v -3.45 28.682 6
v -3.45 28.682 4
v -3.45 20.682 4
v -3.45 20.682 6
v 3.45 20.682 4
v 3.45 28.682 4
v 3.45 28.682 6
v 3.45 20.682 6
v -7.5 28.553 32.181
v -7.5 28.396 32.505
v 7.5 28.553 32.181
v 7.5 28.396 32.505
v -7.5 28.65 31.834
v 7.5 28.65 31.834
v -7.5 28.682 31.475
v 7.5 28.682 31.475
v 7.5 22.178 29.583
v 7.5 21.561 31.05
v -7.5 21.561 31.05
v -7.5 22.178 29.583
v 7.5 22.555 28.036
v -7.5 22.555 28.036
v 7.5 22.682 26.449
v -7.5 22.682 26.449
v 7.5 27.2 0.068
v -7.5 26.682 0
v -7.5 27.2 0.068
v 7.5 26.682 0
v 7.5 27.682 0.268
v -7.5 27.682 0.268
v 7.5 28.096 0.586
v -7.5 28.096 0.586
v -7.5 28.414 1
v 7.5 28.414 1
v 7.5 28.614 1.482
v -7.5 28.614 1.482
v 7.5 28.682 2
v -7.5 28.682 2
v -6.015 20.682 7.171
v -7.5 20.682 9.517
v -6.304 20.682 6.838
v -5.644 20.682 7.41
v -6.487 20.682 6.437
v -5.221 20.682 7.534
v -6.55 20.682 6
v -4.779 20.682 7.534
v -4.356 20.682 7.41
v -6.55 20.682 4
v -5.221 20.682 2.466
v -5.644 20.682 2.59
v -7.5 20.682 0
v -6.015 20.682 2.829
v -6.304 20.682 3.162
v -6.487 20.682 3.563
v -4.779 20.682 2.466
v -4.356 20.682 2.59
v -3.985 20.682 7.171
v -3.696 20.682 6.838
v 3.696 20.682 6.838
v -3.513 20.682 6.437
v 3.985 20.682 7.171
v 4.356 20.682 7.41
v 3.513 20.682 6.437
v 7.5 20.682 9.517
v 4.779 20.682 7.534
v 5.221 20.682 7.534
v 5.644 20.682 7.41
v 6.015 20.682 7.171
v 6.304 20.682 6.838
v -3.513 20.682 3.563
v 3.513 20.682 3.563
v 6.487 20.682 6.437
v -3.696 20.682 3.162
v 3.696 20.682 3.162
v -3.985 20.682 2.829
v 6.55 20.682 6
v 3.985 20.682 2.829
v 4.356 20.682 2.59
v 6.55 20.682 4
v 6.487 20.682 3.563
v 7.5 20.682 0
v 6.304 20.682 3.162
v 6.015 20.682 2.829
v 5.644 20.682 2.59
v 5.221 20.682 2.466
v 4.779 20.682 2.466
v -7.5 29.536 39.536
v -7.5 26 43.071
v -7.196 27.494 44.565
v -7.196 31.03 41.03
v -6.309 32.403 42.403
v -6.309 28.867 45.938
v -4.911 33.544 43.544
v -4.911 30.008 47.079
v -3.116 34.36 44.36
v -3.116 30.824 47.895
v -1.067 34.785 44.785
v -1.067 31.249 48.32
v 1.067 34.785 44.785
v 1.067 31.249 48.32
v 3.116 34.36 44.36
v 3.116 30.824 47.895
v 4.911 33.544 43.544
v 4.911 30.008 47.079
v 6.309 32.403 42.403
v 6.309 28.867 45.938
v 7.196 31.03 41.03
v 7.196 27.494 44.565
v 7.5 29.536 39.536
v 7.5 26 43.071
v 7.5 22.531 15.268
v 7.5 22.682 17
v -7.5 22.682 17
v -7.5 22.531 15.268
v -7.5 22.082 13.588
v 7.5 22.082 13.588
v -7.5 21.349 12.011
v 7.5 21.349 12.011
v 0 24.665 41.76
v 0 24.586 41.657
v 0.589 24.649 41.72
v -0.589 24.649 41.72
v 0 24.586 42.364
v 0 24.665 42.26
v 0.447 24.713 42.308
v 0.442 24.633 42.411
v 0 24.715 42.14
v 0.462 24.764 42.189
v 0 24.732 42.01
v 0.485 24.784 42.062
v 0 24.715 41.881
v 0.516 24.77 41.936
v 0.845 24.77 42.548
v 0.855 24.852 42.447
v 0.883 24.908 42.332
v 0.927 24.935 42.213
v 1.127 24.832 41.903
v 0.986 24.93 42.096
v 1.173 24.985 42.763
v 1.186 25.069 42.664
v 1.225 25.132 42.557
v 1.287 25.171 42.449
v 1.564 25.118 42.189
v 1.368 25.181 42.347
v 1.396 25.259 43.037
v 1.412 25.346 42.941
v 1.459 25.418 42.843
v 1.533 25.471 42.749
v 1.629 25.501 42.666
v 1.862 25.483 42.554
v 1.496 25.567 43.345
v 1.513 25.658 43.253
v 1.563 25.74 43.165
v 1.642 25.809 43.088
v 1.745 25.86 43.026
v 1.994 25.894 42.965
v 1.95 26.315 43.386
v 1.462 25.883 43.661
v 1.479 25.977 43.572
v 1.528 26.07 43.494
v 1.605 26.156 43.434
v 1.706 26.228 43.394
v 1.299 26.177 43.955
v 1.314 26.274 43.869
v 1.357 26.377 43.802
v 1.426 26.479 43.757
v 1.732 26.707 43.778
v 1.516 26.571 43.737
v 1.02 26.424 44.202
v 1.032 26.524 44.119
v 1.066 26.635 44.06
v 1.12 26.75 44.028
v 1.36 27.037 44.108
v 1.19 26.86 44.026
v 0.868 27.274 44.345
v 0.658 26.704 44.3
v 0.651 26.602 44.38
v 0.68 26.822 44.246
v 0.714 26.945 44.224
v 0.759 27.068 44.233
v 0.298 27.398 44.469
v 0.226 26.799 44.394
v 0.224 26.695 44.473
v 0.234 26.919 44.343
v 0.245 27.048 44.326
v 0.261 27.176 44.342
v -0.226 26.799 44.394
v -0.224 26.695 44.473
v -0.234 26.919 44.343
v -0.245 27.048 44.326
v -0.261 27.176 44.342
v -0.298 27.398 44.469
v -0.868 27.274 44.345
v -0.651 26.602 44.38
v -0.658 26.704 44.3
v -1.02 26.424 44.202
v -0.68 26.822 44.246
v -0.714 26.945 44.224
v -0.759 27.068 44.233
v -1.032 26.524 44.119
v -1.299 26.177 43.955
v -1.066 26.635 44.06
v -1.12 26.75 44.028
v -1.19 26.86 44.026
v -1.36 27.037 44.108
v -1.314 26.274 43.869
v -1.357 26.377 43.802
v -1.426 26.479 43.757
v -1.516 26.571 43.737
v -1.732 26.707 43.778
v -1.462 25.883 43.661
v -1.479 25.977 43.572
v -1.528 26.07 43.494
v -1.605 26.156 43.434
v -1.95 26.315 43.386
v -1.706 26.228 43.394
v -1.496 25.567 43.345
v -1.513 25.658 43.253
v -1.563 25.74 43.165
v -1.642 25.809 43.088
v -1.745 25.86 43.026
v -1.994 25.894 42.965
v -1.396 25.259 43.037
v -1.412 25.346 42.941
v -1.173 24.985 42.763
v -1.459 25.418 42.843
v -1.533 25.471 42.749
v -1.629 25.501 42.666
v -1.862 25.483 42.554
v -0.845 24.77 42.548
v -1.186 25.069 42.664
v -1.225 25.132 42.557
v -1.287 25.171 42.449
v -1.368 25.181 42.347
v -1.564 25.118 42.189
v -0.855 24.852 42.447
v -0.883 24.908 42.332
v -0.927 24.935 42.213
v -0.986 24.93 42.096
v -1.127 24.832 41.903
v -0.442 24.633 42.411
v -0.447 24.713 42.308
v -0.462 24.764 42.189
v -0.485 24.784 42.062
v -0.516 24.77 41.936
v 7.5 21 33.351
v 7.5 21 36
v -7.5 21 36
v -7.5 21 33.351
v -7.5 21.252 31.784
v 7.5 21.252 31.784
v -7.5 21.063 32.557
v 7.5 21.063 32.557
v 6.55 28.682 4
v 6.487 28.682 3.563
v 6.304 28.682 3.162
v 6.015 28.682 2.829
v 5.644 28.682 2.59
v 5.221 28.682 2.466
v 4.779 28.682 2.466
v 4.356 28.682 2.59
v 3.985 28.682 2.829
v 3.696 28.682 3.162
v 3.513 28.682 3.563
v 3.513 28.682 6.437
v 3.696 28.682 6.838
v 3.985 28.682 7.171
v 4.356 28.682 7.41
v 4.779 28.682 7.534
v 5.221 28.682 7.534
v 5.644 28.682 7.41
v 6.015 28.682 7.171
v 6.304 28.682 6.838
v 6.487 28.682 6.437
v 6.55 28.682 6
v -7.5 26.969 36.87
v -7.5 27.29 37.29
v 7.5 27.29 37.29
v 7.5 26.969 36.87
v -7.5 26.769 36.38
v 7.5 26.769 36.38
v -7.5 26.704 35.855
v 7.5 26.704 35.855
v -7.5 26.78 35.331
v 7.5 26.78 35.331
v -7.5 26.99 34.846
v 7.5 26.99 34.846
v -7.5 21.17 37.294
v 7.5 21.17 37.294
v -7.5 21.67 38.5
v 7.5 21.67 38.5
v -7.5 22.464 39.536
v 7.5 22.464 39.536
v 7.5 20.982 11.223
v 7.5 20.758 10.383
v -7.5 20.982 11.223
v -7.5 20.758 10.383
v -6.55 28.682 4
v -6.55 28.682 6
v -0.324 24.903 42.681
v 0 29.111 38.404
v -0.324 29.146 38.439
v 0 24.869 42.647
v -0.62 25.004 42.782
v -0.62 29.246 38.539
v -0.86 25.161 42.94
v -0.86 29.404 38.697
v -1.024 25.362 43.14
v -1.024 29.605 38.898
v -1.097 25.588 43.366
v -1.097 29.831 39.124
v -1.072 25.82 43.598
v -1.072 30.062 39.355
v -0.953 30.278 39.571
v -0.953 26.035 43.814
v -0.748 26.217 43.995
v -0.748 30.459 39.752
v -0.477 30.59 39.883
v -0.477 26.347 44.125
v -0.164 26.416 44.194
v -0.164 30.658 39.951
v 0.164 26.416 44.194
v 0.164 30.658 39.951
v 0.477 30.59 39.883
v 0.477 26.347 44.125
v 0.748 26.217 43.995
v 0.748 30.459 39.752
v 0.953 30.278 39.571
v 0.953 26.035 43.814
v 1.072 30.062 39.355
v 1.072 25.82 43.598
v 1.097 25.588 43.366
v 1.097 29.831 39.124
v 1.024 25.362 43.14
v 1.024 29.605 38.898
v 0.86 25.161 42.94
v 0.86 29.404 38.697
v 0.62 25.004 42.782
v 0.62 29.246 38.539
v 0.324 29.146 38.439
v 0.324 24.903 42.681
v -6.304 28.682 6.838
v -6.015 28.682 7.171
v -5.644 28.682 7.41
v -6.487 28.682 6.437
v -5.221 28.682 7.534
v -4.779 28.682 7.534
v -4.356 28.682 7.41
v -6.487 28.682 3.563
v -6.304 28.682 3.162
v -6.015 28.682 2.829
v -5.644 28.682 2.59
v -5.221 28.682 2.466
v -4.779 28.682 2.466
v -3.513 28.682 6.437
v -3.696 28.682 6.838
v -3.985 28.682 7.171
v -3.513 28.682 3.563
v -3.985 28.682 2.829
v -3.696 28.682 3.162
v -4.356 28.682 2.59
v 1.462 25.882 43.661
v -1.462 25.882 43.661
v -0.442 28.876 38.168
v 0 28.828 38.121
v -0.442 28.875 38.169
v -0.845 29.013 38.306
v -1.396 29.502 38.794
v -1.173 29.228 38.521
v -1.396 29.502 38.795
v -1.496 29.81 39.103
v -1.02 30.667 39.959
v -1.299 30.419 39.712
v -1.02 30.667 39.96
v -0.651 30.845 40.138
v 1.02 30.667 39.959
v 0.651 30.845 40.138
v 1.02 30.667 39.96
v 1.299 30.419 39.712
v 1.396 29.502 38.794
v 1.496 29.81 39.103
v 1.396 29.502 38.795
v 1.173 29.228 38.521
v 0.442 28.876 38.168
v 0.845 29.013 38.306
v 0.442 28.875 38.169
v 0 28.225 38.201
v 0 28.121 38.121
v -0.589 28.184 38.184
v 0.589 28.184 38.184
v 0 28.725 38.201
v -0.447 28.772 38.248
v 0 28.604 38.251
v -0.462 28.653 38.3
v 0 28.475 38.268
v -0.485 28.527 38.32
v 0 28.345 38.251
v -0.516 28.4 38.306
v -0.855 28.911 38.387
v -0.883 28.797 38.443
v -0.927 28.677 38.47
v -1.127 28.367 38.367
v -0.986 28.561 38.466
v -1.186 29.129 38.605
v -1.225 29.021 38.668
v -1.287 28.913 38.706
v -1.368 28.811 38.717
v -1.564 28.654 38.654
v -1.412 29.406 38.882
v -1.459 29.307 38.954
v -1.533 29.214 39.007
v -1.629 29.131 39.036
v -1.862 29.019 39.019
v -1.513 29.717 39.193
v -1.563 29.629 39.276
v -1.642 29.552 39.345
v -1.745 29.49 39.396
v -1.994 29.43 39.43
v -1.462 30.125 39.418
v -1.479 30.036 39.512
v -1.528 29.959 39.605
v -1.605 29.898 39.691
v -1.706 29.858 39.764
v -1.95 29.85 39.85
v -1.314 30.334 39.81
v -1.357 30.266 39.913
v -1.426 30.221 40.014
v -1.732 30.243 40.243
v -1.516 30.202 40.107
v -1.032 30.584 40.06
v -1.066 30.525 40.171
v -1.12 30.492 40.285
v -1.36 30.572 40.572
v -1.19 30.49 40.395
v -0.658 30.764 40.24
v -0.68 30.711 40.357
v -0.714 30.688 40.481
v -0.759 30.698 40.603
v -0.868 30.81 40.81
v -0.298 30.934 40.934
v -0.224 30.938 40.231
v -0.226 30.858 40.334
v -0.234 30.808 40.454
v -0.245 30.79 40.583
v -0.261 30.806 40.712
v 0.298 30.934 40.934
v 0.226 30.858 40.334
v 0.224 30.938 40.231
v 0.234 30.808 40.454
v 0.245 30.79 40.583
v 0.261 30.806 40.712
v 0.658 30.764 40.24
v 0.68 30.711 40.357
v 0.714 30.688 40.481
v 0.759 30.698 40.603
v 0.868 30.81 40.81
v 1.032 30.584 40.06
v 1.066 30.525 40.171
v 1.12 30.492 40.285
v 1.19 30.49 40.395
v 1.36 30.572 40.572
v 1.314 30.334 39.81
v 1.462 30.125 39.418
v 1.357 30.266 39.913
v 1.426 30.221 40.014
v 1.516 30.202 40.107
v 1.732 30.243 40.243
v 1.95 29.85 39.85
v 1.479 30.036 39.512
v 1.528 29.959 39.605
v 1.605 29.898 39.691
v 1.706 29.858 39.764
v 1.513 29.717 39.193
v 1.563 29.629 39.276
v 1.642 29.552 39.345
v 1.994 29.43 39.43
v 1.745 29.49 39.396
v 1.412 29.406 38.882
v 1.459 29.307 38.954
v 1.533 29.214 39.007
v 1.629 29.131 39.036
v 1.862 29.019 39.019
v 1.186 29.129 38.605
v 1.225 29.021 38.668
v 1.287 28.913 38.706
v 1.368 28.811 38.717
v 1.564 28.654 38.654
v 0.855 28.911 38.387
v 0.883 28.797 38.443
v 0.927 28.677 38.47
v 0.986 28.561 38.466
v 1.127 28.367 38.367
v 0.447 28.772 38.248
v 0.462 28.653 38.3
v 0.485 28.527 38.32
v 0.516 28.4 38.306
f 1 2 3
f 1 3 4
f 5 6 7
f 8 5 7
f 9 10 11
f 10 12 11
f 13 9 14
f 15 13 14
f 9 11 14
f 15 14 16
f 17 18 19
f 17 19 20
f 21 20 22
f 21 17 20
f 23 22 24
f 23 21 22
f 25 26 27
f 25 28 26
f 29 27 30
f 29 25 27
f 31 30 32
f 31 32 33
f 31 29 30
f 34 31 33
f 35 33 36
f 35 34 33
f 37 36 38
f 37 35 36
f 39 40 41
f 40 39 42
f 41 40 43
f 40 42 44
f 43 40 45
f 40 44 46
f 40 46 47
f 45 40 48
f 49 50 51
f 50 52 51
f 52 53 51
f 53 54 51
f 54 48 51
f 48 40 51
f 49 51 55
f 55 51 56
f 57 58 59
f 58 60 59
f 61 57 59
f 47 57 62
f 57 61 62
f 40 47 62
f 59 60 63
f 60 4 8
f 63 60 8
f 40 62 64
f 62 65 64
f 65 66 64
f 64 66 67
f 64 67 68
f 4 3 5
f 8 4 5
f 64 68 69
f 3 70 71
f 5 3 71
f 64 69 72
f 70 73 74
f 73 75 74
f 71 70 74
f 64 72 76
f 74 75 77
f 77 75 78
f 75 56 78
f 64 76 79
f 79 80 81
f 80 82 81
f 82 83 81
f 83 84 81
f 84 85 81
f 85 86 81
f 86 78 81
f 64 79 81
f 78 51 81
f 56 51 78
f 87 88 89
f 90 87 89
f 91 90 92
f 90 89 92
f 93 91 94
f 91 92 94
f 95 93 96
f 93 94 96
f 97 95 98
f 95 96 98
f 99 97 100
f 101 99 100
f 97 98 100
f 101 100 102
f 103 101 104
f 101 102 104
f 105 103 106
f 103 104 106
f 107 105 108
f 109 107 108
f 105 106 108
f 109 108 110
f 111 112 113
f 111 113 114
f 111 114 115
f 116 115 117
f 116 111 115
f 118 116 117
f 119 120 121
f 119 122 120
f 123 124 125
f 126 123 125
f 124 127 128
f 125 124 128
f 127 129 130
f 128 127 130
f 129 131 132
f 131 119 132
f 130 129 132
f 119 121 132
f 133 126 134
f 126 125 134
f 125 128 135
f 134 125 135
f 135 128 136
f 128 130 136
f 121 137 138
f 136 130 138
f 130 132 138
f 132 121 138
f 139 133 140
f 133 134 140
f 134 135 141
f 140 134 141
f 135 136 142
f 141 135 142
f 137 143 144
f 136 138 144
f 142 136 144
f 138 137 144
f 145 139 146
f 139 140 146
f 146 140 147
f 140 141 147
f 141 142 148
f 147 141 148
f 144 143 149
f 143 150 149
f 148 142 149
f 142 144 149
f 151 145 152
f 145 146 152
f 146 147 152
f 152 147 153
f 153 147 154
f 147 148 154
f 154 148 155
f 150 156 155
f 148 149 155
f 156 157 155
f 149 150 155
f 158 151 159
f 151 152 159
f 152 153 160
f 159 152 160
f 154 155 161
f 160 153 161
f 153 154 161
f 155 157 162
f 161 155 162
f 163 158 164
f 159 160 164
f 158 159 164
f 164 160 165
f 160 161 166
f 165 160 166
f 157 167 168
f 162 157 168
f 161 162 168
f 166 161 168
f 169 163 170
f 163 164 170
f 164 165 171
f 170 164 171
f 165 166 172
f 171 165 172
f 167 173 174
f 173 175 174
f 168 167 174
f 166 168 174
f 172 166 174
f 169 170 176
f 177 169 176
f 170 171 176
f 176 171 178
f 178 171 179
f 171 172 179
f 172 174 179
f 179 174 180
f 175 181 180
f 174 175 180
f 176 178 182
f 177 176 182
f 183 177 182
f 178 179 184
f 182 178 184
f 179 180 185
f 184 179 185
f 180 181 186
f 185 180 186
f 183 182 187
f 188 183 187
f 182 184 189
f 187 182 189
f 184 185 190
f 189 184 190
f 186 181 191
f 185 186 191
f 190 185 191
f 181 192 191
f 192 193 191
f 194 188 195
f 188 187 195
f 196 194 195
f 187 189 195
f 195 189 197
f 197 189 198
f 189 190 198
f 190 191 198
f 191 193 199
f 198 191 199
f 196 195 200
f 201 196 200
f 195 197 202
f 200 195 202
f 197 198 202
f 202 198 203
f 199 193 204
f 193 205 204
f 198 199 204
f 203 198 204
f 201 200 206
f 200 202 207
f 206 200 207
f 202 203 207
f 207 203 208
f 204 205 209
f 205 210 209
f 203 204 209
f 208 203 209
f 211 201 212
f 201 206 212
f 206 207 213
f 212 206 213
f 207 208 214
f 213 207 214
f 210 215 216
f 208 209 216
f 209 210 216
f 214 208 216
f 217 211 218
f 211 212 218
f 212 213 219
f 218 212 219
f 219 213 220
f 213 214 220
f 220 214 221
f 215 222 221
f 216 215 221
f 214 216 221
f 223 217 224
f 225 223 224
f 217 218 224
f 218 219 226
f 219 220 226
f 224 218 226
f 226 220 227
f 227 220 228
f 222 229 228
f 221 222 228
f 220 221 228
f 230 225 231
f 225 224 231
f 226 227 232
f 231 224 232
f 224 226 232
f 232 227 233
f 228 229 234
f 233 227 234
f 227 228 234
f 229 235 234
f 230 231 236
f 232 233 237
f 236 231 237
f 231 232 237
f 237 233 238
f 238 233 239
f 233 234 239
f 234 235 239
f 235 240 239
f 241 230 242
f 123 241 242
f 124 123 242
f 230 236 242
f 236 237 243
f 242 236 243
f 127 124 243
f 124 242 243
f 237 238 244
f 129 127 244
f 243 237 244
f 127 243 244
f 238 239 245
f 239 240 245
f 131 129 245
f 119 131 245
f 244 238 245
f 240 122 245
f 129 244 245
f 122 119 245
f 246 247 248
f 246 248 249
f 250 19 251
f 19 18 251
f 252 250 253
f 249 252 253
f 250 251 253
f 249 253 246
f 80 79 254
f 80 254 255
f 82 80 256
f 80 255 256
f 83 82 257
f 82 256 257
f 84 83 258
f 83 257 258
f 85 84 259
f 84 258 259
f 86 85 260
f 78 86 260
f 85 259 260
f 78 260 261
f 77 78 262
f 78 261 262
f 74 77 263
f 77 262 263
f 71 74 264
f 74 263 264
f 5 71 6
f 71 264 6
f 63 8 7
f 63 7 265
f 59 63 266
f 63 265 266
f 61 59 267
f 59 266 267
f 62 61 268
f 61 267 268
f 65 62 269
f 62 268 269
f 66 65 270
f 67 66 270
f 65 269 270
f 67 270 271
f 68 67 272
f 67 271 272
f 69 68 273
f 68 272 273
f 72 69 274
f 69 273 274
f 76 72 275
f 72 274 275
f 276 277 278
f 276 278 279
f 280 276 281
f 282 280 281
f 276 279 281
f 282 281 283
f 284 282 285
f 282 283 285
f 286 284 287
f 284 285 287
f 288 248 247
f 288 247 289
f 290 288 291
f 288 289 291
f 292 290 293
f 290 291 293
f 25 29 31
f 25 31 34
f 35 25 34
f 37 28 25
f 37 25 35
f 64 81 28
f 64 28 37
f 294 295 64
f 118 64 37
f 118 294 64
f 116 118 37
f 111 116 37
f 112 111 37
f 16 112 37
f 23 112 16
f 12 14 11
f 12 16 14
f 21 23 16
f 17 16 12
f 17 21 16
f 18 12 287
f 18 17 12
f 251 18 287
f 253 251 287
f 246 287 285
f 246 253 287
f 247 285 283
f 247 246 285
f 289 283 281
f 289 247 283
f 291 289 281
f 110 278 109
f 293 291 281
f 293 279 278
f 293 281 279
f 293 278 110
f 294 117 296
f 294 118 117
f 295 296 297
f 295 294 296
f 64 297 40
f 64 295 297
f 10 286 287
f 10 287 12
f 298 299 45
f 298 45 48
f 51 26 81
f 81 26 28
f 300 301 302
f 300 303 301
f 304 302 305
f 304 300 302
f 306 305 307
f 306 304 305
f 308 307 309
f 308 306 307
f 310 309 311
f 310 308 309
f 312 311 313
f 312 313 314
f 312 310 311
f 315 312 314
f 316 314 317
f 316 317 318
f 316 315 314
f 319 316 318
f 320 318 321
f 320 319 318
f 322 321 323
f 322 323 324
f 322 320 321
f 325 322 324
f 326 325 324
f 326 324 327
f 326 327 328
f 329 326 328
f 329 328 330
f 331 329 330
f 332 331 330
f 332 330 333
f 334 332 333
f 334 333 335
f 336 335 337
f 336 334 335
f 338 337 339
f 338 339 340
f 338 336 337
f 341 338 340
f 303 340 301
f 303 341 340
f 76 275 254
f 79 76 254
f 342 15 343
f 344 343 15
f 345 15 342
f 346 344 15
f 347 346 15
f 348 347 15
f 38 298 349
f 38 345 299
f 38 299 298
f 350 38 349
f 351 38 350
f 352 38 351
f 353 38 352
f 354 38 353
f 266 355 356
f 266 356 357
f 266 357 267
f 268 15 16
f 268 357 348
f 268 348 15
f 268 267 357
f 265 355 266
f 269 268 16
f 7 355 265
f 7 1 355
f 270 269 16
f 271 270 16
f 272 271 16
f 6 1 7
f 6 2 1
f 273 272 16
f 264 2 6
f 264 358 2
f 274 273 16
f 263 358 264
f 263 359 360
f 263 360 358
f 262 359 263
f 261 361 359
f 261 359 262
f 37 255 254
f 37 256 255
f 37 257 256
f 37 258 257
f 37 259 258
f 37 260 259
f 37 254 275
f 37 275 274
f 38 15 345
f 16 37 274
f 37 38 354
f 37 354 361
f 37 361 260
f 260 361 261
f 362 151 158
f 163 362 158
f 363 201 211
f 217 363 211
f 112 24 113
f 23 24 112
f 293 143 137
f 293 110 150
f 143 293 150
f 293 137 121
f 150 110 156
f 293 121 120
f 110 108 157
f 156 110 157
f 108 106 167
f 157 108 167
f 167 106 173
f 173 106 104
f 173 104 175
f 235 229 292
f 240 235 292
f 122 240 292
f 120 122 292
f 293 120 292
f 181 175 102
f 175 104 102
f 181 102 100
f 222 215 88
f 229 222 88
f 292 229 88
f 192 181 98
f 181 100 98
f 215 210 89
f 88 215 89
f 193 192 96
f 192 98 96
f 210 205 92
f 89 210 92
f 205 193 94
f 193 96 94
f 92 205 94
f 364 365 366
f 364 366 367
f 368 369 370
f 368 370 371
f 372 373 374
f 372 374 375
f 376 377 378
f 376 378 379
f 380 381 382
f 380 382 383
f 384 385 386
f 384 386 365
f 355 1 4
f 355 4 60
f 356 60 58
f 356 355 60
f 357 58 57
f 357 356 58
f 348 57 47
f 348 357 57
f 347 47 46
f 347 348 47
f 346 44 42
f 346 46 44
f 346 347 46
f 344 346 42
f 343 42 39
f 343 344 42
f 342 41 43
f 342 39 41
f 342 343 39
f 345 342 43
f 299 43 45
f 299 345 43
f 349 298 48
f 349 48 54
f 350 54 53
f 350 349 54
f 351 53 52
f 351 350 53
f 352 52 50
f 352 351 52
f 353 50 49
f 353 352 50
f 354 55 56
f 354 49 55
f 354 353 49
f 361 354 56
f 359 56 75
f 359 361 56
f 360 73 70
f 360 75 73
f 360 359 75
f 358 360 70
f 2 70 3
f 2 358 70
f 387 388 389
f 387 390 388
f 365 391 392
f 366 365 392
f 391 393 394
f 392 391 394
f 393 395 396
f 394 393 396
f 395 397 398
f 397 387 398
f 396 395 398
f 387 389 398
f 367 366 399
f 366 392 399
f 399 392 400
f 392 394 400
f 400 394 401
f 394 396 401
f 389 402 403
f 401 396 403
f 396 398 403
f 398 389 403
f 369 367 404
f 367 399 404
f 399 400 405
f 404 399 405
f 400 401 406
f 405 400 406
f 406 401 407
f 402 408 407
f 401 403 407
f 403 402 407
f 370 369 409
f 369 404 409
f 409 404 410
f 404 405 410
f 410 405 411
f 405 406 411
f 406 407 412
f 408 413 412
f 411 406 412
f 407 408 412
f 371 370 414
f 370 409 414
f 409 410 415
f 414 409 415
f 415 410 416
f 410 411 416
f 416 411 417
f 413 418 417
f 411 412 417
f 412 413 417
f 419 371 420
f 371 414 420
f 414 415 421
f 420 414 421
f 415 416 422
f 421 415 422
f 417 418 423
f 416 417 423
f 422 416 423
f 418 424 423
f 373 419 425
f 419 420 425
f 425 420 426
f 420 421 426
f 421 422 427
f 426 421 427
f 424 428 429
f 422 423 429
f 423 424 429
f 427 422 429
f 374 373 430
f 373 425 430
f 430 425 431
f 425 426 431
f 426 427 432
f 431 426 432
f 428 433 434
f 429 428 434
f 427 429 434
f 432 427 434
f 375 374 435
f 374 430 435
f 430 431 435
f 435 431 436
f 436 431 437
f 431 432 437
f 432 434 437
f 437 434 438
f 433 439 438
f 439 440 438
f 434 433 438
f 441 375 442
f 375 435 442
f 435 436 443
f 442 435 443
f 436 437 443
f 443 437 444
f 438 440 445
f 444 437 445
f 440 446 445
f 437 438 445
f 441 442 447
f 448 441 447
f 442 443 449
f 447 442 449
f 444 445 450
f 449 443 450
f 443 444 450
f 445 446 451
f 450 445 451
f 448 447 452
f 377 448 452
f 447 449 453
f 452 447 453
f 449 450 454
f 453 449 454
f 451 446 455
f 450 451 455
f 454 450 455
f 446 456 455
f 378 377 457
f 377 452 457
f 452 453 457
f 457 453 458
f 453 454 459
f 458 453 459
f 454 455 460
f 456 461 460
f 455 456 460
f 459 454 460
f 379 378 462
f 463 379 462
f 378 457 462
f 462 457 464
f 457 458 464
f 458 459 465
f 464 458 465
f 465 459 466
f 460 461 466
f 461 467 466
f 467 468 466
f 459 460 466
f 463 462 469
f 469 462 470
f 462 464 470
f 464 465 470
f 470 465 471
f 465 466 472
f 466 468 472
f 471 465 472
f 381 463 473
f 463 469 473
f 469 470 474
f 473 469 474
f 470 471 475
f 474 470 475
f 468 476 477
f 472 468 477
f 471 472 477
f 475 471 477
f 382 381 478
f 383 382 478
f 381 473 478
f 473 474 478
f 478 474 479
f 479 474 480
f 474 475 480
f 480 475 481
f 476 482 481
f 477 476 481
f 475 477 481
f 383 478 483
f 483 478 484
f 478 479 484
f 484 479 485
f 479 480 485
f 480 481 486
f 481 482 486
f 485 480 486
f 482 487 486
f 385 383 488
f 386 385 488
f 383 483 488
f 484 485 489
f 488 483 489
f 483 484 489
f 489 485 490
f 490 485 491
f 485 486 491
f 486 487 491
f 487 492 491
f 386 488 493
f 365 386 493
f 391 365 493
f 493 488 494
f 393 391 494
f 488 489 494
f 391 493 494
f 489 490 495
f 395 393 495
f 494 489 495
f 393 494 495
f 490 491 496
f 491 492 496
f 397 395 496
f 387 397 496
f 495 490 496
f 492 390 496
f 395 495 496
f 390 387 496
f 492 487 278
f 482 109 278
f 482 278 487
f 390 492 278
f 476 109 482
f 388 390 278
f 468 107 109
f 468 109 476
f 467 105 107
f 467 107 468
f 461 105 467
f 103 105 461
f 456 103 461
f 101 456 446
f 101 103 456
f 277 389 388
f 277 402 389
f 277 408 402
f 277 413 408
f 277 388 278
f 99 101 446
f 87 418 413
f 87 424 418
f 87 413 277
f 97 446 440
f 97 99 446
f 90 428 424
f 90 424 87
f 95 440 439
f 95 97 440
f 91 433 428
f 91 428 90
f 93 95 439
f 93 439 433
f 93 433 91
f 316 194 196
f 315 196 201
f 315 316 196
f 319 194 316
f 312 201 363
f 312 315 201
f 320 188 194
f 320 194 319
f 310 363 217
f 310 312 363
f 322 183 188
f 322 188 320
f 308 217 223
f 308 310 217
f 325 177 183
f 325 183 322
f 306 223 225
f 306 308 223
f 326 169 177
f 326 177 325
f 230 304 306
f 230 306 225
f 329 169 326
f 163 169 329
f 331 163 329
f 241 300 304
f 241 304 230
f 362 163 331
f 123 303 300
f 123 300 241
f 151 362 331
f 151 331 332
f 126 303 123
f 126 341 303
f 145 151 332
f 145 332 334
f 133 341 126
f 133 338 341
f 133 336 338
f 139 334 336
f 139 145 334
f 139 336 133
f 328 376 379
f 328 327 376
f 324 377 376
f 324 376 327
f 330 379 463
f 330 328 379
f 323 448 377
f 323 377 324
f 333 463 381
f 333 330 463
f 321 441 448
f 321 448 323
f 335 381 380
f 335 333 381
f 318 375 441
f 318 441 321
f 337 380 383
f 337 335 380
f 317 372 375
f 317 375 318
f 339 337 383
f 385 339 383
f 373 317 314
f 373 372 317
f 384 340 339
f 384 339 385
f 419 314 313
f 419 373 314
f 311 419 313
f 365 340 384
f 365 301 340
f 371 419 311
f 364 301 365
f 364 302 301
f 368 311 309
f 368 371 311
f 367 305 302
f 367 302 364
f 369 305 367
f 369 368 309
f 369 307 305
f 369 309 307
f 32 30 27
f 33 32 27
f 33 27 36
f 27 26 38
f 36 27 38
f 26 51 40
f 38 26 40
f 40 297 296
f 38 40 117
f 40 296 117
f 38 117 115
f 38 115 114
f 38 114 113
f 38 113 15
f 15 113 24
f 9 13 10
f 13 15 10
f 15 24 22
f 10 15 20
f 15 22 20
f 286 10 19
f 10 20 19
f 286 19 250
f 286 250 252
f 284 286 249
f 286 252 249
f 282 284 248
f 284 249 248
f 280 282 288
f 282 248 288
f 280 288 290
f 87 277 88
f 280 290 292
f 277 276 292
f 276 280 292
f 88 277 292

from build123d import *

# Parameters (mm, degrees)
SKETCH_10_W         = 15
SKETCH_10_H         = 8
EXTRUDE_7_DEPTH     = 26
CUT_EXTRUDE_4_DEPTH = 11
SKETCH_12_W         = 15
SKETCH_12_H         = 6
EXTRUDE_8_DEPTH     = 6
SKETCH_14_W         = 15
SKETCH_14_H         = 5
EXTRUDE_9_DEPTH     = 4
EXTRUDE_10_DEPTH    = 15
EXTRUDE_11_DEPTH    = 5
SKETCH_19_R         = 1.1
CUT_EXTRUDE_5_DEPTH = 5
EXTRUDE_START       = 0.5
SKETCH_20_R         = 1.5
SKETCH_20_R_2       = 1.1
EXTRUDE_12_DEPTH    = 0.5
SKETCH_21_R         = 1.5
SKETCH_21_R_2       = 1.1
EXTRUDE_13_DEPTH    = 0.5
FILLET_4_R          = 0.5
CHAMFER_1_SIZE      = 4.493554602
CHAMFER_1_SIZE_2    = 2.7
FILLET_7_R          = 2
SKETCH_22_W         = 15
SKETCH_22_H         = 2
CUT_EXTRUDE_6_DEPTH = 15
FILLET_8_R          = 10
FILLET_9_R          = 5
FILLET_10_R         = 2


# Some blends are built 0.0001 mm under size
with BuildPart() as part:
    # 草图10 → 凸台-拉伸7 (new body)
    with BuildSketch(Plane.XY):
        with Locations((0, 24.68211788)):
            Rectangle(SKETCH_10_W, SKETCH_10_H)
    extrude(amount=EXTRUDE_7_DEPTH)

    # 草图11 → 切除-拉伸4 (cut)
    with BuildSketch(Plane(origin=(0, 28.68211788, 0), x_dir=(1, 0, 0), z_dir=(0, 1, 0))):
        with BuildLine():
            Line((-3.45, -4), (-3.45, -6))
            ThreePointArc((-3.45, -6), (-5, -7.55), (-6.55, -6))
            Line((-6.55, -6), (-6.55, -4))
            ThreePointArc((-6.55, -4), (-5, -2.45), (-3.45, -4))
        make_face()
        with BuildLine():
            Line((3.45, -4), (3.45, -6))
            ThreePointArc((3.45, -6), (5, -7.55), (6.55, -6))
            Line((6.55, -6), (6.55, -4))
            ThreePointArc((6.55, -4), (5, -2.45), (3.45, -4))
        make_face()
    extrude(amount=-CUT_EXTRUDE_4_DEPTH, mode=Mode.SUBTRACT)

    # 草图12 → 凸台-拉伸8 (add)
    with BuildSketch(Plane.XY.offset(26)):
        with Locations((0, 25.68211788)):
            Rectangle(SKETCH_12_W, SKETCH_12_H)
    extrude(amount=EXTRUDE_8_DEPTH)

    # 草图14 → 凸台-拉伸9 (add)
    with BuildSketch(Plane.XY.offset(32)):
        with Locations((0, 23.5)):
            Rectangle(SKETCH_14_W, SKETCH_14_H)
    extrude(amount=EXTRUDE_9_DEPTH)

    # 草图17 → 凸台-拉伸10 (add)
    with BuildSketch(Plane.ZY.offset(7.5)):
        Polygon((36, 26), (39.535533906, 29.535533906), (43.071067812, 26), (38.071067812, 21), (36, 21), align=None)
    extrude(amount=-EXTRUDE_10_DEPTH)

    # 草图18 → 凸台-拉伸11 (add)
    with BuildSketch(Plane(origin=(0, -8.535533906, 8.535533906), x_dir=(1, 0, 0), z_dir=(0, -0.7071067811865507, 0.7071067811865445))):
        with BuildLine():
            Line((7.5, 48.840620434), (-7.5, 48.840620434))
            ThreePointArc((-7.5, 48.840620434), (0, 56.340620434), (7.5, 48.840620434))
        make_face()
    extrude(amount=-EXTRUDE_11_DEPTH)

    # 草图19 → 切除-拉伸5 (cut)
    with BuildSketch(Plane(origin=(0, -8.535533906, 8.535533906), x_dir=(1, 0, 0), z_dir=(0, -0.7071067811865507, 0.7071067811865445))):
        with Locations(Location((0, 48.840620434, 0), (0, 0, 270))):
            Circle(SKETCH_19_R)
    extrude(amount=-CUT_EXTRUDE_5_DEPTH, mode=Mode.SUBTRACT)

    # 草图20 → 凸台-拉伸12 (add)
    with BuildSketch(Plane(origin=(0, -8.535533906, 8.535533906), x_dir=(1, 0, 0), z_dir=(0, -0.7071067811865507, 0.7071067811865445)).offset(EXTRUDE_START)):
        with Locations(Location((0, 48.840620434, 0), (0, 0, 270))):
            Circle(SKETCH_20_R)
        with Locations(Location((0, 48.840620434, 0), (0, 0, 270))):
            Circle(SKETCH_20_R_2, mode=Mode.SUBTRACT)
    extrude(amount=-EXTRUDE_12_DEPTH)

    # 草图21 → 凸台-拉伸13 (add)
    with BuildSketch(Plane(origin=(0, -5, 5), x_dir=(1, 0, 0), z_dir=(0, 0.7071067811865513, -0.7071067811865437))):
        with Locations(Location((0, -48.840620434, 0), (0, 0, 90))):
            Circle(SKETCH_21_R)
        with Locations(Location((0, -48.840620434, 0), (0, 0, 90))):
            Circle(SKETCH_21_R_2, mode=Mode.SUBTRACT)
    extrude(amount=EXTRUDE_13_DEPTH)

    # 圆角4
    fillet_4_edges = [part.edges().sort_by_distance(p)[0] for p in [
        (0, 27.060660172, 44.131727984),
        (0, 30.596194078, 40.596194078),
    ]]
    fillet(fillet_4_edges, radius=FILLET_4_R - 0.0001)  # a hair under: the kernel refuses the full size

    # 倒角1
    # the kernel refuses this chamfer: 4.493554602, 2.7 mm, written as the material it adds along each edge
    with BuildSketch(Plane(origin=(-7.5, 26, 32), x_dir=(0, -0.019914630580833353, 0.9998016840798123), z_dir=(1, 0, 0))) as chamfer_1_piece_1_section:
        Polygon((CHAMFER_1_SIZE * 0.999801684157, -CHAMFER_1_SIZE * 0.0199146305824), (-CHAMFER_1_SIZE_2 * 0.0199146305808, -CHAMFER_1_SIZE_2 * 0.99980168408), (0, 0), align=None)
    chamfer_1_piece_1 = extrude(amount=15, mode=Mode.PRIVATE)
    chamfer_1_piece_1 = split(chamfer_1_piece_1, bisect_by=Plane(origin=(0, 28.68211788, 33.477199106), z_dir=(0, -1, 0)), keep=Keep.TOP, mode=Mode.PRIVATE)
    add(chamfer_1_piece_1)

    # 圆角7
    fillet_7_edges = [part.edges().sort_by_distance(p)[0] for p in [
        (0, 26.18524881, 36.18524881),
        (0, 28.68211788, 32.029760846),
    ]]
    fillet(fillet_7_edges, radius=FILLET_7_R)

    # 草图22 → 切除-拉伸6 (cut)
    with BuildSketch(Plane.XY.offset(26)):
        with Locations((0, 21.68211788)):
            Rectangle(SKETCH_22_W, SKETCH_22_H)
    extrude(amount=-CUT_EXTRUDE_6_DEPTH, mode=Mode.SUBTRACT)

    # 圆角8
    # the kernel refuses this fillet: 10 mm, written as the material it adds along each edge
    with BuildSketch(Plane(origin=(7.5, 22.68211788, 11), x_dir=(0, -1, 0), z_dir=(-1, 0, 0))) as fillet_8_piece_1:
        with BuildLine():
            CenterArc((10, 6), FILLET_8_R, 180, 36.869897646)
            Line((0, 6), (-0.2, 6))
            Line((-0.2, 6), (-0.2, 0))
            Line((-0.2, 0), (0, -0.2))
            ThreePointArc((0, -0.2), (1, -0.2), (1.84, -0.12))
            Line((1.84, -0.12), (2, 0))
        make_face()
    extrude(amount=15)
    with BuildSketch(Plane(origin=(7.5, 22.68211788, 32), x_dir=(0, 0, -1), z_dir=(-1, 0, 0))) as fillet_8_piece_2:
        with BuildLine():
            CenterArc((5.550931186, 10), FILLET_8_R, 236.282871199, 33.717128801)
            Line((0, 1.68211788), (-0.111018624, 1.515760238))
            ThreePointArc((-0.111018624, 1.515760238), (-0.2, 0.84105894), (-0.2, 0))
            Line((-0.2, 0), (0, -0.2))
            Line((0, -0.2), (5.550931186, -0.2))
            Line((5.550931186, -0.2), (5.550931186, 0))
        make_face()
    extrude(amount=15)

    # 圆角9
    fillet_9_edges = [part.edges().sort_by_distance(p)[0] for p in [
        (0, 20.68211788, 11),
        (0, 21, 32),
        (0, 21, 38.071067812),
    ]]
    fillet(fillet_9_edges, radius=FILLET_9_R)

    # 圆角10
    fillet_10_edges = [part.edges().sort_by_distance(p)[0] for p in [
        (0, 28.68211788, 0),
    ]]
    fillet(fillet_10_edges, radius=FILLET_10_R)


solid = part.part
